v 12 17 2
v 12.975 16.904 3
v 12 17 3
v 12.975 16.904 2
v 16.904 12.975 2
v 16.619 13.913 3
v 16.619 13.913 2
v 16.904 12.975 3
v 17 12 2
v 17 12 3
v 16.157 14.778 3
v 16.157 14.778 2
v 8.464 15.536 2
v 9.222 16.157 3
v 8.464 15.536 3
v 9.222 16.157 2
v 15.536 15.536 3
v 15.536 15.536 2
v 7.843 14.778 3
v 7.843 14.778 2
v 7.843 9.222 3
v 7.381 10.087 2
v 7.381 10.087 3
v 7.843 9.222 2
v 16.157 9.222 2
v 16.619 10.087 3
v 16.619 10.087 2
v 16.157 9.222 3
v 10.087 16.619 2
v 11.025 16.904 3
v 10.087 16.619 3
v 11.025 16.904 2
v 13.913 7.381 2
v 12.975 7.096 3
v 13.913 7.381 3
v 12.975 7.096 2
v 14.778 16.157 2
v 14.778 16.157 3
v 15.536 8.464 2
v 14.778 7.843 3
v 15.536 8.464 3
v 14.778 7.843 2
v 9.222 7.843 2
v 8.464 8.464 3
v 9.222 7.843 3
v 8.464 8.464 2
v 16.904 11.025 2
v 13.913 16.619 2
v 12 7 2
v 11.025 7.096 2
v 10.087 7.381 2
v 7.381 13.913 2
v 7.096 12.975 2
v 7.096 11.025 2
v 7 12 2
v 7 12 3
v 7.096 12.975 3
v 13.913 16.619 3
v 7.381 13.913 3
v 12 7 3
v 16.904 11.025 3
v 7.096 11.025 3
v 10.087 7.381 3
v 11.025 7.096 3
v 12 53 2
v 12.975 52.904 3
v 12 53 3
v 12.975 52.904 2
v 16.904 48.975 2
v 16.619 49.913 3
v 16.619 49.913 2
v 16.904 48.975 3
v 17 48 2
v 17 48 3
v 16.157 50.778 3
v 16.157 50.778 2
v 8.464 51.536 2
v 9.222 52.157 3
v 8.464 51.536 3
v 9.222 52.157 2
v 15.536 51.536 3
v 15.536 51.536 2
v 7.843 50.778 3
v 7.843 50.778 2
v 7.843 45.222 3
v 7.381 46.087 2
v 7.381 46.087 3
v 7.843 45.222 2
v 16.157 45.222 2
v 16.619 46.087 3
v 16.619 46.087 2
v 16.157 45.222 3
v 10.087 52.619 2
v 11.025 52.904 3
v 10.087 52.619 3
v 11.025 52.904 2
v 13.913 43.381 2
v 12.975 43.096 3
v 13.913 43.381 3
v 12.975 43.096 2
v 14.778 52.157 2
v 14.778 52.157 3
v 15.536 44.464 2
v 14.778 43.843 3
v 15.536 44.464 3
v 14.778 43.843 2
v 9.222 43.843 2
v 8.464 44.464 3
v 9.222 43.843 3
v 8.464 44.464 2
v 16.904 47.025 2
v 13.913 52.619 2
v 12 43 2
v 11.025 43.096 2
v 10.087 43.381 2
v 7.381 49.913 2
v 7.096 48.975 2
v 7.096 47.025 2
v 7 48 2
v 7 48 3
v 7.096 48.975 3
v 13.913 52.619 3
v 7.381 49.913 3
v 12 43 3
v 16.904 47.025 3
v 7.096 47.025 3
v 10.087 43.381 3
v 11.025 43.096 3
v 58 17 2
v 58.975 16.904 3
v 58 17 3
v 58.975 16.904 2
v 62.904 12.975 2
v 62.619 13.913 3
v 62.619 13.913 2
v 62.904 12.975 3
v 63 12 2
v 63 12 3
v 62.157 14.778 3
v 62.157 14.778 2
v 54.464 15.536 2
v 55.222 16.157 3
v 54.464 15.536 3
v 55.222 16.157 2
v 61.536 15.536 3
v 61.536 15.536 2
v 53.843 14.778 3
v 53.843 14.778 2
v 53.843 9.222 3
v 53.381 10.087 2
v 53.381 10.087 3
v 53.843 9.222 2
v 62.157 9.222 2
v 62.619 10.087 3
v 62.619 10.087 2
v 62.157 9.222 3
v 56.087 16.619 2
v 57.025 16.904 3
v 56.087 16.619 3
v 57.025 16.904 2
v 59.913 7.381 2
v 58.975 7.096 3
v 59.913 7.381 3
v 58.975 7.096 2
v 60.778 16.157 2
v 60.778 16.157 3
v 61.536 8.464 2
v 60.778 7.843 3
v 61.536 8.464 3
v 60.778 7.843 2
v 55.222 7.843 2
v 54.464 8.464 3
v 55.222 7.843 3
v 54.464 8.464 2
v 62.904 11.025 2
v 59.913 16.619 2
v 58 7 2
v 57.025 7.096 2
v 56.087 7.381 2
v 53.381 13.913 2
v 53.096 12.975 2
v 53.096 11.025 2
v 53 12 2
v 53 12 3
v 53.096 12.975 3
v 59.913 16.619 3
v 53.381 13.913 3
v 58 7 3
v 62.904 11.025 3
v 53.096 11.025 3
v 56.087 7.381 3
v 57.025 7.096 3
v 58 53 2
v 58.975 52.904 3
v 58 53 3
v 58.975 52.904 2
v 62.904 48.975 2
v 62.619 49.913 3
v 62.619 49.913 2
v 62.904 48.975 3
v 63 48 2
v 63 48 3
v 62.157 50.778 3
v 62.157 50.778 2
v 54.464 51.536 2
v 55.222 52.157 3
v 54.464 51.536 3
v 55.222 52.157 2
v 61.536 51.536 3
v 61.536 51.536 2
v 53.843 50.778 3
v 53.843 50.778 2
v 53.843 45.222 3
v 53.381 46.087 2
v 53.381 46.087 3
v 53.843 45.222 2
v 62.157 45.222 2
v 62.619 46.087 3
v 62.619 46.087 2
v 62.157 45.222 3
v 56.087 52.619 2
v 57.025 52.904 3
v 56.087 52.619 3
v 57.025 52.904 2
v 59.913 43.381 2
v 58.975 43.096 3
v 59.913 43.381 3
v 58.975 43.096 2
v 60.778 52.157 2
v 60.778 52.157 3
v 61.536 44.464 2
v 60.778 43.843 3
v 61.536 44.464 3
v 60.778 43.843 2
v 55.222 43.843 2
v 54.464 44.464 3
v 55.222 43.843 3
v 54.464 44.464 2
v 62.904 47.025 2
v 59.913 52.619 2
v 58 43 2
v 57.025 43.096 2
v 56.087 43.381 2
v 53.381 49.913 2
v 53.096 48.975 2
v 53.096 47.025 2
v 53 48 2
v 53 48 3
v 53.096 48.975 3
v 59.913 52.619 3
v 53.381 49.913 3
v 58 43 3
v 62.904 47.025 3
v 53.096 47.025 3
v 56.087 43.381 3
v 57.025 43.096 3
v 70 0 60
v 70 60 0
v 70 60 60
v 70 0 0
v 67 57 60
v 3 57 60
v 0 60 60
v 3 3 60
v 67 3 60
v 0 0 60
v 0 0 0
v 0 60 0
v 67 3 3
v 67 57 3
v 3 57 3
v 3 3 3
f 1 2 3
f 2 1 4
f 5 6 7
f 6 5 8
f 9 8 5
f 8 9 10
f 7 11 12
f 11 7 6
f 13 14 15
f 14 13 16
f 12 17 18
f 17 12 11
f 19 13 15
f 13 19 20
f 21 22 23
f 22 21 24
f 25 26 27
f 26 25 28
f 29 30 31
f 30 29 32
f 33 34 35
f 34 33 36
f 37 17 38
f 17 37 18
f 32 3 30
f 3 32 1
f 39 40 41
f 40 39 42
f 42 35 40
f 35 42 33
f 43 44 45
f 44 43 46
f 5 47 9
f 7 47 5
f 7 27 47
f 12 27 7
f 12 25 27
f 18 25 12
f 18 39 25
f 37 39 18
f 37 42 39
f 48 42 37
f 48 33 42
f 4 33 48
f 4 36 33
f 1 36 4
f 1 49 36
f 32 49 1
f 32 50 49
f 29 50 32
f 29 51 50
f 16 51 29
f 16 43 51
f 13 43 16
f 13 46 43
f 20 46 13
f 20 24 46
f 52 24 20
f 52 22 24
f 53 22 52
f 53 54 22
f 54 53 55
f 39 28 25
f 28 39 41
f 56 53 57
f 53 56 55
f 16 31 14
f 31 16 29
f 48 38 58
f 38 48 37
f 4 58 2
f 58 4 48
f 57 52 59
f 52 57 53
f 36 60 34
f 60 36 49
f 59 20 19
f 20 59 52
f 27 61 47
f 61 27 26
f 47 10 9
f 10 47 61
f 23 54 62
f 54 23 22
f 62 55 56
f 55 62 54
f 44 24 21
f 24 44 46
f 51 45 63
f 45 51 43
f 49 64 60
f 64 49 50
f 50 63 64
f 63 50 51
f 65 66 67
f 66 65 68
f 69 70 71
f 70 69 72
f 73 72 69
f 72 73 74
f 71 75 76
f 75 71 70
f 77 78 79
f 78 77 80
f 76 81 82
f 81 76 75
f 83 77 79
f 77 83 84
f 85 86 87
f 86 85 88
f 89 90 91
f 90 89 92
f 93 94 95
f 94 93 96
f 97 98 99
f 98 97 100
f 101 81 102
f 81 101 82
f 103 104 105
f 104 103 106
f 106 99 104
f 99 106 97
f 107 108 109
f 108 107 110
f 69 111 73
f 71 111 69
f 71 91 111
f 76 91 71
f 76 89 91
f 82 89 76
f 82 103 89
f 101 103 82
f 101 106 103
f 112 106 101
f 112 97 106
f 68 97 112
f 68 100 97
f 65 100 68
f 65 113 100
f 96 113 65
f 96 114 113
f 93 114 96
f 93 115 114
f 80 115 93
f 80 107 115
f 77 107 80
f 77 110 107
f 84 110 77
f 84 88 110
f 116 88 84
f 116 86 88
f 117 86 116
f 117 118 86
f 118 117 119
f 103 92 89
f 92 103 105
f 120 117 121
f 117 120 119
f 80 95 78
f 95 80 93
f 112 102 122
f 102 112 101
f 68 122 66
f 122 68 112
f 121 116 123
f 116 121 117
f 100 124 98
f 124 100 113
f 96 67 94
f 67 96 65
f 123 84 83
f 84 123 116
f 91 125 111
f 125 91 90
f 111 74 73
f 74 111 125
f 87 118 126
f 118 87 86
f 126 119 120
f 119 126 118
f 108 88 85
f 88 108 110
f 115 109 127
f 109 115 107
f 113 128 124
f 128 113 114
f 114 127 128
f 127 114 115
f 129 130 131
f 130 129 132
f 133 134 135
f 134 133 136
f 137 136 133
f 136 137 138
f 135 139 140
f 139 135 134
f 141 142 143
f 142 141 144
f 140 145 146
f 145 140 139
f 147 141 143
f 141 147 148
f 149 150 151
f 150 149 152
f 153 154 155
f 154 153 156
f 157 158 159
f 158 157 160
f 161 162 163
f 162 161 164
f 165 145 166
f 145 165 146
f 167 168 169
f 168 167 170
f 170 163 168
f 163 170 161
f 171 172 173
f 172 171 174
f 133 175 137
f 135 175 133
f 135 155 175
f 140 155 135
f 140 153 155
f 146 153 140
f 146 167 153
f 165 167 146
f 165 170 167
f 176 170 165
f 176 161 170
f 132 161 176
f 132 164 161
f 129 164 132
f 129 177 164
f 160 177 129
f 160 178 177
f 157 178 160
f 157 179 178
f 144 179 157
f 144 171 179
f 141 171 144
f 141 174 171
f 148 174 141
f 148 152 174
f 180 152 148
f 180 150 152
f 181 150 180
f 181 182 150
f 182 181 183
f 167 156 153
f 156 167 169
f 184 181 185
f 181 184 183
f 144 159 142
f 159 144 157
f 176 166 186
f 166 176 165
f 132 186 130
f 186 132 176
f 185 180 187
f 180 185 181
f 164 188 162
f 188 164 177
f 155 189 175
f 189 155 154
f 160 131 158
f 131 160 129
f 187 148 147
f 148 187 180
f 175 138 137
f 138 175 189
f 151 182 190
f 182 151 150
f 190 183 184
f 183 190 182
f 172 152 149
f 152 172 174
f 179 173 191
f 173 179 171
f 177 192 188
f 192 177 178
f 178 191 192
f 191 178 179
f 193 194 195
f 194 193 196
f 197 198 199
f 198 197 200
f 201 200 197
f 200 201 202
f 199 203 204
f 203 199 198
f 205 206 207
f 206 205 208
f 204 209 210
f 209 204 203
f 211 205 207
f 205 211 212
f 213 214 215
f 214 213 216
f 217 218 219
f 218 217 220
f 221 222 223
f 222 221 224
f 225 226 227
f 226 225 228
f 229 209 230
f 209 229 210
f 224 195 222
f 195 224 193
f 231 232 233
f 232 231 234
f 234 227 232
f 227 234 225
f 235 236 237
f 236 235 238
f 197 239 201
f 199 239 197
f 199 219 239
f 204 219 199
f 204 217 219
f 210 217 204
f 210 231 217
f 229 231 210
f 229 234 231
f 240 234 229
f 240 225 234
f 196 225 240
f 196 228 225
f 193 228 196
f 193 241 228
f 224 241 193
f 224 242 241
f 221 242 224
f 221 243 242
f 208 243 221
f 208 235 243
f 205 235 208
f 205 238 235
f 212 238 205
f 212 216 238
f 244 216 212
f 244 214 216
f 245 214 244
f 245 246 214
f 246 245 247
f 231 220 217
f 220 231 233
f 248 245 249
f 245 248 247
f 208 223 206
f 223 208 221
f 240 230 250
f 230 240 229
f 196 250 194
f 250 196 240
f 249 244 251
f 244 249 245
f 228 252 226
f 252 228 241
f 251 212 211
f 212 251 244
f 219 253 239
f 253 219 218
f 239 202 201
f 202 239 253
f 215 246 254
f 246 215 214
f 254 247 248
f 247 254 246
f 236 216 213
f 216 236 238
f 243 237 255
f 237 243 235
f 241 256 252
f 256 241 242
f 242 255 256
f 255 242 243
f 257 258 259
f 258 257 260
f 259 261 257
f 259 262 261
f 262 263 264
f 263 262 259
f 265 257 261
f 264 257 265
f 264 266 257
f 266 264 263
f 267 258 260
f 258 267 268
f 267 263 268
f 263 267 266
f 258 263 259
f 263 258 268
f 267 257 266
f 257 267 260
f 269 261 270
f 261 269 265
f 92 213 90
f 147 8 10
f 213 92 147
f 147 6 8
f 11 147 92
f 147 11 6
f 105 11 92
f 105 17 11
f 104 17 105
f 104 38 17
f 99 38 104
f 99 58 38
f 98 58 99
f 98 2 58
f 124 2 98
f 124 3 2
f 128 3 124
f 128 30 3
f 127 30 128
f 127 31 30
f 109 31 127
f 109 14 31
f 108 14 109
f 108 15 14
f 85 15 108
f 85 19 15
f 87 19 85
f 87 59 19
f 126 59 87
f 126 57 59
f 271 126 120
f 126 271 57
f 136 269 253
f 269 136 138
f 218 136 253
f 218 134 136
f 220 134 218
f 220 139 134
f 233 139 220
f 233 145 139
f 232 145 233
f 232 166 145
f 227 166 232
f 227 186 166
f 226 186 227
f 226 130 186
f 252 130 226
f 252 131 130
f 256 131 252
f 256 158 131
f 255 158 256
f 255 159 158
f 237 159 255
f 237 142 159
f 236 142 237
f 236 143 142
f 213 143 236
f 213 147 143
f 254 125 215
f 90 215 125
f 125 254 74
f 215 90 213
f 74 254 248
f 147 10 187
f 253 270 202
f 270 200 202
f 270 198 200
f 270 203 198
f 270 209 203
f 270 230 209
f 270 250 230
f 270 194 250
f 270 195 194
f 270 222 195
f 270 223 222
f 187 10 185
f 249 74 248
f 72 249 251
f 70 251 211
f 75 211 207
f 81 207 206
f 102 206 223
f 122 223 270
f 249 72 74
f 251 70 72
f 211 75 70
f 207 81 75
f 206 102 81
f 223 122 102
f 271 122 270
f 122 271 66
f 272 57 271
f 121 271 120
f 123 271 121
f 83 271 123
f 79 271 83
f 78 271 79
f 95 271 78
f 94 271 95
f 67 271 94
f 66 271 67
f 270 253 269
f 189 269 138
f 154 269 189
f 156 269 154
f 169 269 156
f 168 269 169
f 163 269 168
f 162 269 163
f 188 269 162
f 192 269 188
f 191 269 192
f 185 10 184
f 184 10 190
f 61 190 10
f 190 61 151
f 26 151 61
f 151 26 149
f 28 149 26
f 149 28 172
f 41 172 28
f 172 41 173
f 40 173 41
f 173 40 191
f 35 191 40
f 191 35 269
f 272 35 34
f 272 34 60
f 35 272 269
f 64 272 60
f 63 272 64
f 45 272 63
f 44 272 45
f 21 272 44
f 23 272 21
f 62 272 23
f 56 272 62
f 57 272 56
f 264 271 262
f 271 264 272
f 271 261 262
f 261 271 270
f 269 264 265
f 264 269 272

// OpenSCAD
$fn = 32;

// ----------------------------------------------------------------------
// Enclosure box: bosses enclosure
// ----------------------------------------------------------------------

// --- parameters (mm) ---
box_l = 70;               // outer length, X
box_w = 60;               // outer width, Y
box_h = 60;               // outer height
wall_t = 3;               // wall thickness
boss_r = 5;               // corner boss radius
hole_r = 2;               // boss screw hole radius
boss_in = 12;             // boss inset from the corners

inner_h = box_h - wall_t;  // cavity depth
boss_h = inner_h - 2;  // corner boss height

difference() {
  cube([box_l, box_w, box_h]);
  translate([wall_t, wall_t, wall_t])
    cube([box_l - 2 * wall_t, box_w - 2 * wall_t, box_h]);
  for (sx = [0, 1], sy = [0, 1])
    translate([sx ? box_l - boss_in : boss_in,
               sy ? box_w - boss_in : boss_in, wall_t - 1]) {
      cylinder(r = boss_r, h = boss_h);
      translate([0, 0, boss_h - 4])
        cylinder(r = hole_r, h = 5);
    }
}
